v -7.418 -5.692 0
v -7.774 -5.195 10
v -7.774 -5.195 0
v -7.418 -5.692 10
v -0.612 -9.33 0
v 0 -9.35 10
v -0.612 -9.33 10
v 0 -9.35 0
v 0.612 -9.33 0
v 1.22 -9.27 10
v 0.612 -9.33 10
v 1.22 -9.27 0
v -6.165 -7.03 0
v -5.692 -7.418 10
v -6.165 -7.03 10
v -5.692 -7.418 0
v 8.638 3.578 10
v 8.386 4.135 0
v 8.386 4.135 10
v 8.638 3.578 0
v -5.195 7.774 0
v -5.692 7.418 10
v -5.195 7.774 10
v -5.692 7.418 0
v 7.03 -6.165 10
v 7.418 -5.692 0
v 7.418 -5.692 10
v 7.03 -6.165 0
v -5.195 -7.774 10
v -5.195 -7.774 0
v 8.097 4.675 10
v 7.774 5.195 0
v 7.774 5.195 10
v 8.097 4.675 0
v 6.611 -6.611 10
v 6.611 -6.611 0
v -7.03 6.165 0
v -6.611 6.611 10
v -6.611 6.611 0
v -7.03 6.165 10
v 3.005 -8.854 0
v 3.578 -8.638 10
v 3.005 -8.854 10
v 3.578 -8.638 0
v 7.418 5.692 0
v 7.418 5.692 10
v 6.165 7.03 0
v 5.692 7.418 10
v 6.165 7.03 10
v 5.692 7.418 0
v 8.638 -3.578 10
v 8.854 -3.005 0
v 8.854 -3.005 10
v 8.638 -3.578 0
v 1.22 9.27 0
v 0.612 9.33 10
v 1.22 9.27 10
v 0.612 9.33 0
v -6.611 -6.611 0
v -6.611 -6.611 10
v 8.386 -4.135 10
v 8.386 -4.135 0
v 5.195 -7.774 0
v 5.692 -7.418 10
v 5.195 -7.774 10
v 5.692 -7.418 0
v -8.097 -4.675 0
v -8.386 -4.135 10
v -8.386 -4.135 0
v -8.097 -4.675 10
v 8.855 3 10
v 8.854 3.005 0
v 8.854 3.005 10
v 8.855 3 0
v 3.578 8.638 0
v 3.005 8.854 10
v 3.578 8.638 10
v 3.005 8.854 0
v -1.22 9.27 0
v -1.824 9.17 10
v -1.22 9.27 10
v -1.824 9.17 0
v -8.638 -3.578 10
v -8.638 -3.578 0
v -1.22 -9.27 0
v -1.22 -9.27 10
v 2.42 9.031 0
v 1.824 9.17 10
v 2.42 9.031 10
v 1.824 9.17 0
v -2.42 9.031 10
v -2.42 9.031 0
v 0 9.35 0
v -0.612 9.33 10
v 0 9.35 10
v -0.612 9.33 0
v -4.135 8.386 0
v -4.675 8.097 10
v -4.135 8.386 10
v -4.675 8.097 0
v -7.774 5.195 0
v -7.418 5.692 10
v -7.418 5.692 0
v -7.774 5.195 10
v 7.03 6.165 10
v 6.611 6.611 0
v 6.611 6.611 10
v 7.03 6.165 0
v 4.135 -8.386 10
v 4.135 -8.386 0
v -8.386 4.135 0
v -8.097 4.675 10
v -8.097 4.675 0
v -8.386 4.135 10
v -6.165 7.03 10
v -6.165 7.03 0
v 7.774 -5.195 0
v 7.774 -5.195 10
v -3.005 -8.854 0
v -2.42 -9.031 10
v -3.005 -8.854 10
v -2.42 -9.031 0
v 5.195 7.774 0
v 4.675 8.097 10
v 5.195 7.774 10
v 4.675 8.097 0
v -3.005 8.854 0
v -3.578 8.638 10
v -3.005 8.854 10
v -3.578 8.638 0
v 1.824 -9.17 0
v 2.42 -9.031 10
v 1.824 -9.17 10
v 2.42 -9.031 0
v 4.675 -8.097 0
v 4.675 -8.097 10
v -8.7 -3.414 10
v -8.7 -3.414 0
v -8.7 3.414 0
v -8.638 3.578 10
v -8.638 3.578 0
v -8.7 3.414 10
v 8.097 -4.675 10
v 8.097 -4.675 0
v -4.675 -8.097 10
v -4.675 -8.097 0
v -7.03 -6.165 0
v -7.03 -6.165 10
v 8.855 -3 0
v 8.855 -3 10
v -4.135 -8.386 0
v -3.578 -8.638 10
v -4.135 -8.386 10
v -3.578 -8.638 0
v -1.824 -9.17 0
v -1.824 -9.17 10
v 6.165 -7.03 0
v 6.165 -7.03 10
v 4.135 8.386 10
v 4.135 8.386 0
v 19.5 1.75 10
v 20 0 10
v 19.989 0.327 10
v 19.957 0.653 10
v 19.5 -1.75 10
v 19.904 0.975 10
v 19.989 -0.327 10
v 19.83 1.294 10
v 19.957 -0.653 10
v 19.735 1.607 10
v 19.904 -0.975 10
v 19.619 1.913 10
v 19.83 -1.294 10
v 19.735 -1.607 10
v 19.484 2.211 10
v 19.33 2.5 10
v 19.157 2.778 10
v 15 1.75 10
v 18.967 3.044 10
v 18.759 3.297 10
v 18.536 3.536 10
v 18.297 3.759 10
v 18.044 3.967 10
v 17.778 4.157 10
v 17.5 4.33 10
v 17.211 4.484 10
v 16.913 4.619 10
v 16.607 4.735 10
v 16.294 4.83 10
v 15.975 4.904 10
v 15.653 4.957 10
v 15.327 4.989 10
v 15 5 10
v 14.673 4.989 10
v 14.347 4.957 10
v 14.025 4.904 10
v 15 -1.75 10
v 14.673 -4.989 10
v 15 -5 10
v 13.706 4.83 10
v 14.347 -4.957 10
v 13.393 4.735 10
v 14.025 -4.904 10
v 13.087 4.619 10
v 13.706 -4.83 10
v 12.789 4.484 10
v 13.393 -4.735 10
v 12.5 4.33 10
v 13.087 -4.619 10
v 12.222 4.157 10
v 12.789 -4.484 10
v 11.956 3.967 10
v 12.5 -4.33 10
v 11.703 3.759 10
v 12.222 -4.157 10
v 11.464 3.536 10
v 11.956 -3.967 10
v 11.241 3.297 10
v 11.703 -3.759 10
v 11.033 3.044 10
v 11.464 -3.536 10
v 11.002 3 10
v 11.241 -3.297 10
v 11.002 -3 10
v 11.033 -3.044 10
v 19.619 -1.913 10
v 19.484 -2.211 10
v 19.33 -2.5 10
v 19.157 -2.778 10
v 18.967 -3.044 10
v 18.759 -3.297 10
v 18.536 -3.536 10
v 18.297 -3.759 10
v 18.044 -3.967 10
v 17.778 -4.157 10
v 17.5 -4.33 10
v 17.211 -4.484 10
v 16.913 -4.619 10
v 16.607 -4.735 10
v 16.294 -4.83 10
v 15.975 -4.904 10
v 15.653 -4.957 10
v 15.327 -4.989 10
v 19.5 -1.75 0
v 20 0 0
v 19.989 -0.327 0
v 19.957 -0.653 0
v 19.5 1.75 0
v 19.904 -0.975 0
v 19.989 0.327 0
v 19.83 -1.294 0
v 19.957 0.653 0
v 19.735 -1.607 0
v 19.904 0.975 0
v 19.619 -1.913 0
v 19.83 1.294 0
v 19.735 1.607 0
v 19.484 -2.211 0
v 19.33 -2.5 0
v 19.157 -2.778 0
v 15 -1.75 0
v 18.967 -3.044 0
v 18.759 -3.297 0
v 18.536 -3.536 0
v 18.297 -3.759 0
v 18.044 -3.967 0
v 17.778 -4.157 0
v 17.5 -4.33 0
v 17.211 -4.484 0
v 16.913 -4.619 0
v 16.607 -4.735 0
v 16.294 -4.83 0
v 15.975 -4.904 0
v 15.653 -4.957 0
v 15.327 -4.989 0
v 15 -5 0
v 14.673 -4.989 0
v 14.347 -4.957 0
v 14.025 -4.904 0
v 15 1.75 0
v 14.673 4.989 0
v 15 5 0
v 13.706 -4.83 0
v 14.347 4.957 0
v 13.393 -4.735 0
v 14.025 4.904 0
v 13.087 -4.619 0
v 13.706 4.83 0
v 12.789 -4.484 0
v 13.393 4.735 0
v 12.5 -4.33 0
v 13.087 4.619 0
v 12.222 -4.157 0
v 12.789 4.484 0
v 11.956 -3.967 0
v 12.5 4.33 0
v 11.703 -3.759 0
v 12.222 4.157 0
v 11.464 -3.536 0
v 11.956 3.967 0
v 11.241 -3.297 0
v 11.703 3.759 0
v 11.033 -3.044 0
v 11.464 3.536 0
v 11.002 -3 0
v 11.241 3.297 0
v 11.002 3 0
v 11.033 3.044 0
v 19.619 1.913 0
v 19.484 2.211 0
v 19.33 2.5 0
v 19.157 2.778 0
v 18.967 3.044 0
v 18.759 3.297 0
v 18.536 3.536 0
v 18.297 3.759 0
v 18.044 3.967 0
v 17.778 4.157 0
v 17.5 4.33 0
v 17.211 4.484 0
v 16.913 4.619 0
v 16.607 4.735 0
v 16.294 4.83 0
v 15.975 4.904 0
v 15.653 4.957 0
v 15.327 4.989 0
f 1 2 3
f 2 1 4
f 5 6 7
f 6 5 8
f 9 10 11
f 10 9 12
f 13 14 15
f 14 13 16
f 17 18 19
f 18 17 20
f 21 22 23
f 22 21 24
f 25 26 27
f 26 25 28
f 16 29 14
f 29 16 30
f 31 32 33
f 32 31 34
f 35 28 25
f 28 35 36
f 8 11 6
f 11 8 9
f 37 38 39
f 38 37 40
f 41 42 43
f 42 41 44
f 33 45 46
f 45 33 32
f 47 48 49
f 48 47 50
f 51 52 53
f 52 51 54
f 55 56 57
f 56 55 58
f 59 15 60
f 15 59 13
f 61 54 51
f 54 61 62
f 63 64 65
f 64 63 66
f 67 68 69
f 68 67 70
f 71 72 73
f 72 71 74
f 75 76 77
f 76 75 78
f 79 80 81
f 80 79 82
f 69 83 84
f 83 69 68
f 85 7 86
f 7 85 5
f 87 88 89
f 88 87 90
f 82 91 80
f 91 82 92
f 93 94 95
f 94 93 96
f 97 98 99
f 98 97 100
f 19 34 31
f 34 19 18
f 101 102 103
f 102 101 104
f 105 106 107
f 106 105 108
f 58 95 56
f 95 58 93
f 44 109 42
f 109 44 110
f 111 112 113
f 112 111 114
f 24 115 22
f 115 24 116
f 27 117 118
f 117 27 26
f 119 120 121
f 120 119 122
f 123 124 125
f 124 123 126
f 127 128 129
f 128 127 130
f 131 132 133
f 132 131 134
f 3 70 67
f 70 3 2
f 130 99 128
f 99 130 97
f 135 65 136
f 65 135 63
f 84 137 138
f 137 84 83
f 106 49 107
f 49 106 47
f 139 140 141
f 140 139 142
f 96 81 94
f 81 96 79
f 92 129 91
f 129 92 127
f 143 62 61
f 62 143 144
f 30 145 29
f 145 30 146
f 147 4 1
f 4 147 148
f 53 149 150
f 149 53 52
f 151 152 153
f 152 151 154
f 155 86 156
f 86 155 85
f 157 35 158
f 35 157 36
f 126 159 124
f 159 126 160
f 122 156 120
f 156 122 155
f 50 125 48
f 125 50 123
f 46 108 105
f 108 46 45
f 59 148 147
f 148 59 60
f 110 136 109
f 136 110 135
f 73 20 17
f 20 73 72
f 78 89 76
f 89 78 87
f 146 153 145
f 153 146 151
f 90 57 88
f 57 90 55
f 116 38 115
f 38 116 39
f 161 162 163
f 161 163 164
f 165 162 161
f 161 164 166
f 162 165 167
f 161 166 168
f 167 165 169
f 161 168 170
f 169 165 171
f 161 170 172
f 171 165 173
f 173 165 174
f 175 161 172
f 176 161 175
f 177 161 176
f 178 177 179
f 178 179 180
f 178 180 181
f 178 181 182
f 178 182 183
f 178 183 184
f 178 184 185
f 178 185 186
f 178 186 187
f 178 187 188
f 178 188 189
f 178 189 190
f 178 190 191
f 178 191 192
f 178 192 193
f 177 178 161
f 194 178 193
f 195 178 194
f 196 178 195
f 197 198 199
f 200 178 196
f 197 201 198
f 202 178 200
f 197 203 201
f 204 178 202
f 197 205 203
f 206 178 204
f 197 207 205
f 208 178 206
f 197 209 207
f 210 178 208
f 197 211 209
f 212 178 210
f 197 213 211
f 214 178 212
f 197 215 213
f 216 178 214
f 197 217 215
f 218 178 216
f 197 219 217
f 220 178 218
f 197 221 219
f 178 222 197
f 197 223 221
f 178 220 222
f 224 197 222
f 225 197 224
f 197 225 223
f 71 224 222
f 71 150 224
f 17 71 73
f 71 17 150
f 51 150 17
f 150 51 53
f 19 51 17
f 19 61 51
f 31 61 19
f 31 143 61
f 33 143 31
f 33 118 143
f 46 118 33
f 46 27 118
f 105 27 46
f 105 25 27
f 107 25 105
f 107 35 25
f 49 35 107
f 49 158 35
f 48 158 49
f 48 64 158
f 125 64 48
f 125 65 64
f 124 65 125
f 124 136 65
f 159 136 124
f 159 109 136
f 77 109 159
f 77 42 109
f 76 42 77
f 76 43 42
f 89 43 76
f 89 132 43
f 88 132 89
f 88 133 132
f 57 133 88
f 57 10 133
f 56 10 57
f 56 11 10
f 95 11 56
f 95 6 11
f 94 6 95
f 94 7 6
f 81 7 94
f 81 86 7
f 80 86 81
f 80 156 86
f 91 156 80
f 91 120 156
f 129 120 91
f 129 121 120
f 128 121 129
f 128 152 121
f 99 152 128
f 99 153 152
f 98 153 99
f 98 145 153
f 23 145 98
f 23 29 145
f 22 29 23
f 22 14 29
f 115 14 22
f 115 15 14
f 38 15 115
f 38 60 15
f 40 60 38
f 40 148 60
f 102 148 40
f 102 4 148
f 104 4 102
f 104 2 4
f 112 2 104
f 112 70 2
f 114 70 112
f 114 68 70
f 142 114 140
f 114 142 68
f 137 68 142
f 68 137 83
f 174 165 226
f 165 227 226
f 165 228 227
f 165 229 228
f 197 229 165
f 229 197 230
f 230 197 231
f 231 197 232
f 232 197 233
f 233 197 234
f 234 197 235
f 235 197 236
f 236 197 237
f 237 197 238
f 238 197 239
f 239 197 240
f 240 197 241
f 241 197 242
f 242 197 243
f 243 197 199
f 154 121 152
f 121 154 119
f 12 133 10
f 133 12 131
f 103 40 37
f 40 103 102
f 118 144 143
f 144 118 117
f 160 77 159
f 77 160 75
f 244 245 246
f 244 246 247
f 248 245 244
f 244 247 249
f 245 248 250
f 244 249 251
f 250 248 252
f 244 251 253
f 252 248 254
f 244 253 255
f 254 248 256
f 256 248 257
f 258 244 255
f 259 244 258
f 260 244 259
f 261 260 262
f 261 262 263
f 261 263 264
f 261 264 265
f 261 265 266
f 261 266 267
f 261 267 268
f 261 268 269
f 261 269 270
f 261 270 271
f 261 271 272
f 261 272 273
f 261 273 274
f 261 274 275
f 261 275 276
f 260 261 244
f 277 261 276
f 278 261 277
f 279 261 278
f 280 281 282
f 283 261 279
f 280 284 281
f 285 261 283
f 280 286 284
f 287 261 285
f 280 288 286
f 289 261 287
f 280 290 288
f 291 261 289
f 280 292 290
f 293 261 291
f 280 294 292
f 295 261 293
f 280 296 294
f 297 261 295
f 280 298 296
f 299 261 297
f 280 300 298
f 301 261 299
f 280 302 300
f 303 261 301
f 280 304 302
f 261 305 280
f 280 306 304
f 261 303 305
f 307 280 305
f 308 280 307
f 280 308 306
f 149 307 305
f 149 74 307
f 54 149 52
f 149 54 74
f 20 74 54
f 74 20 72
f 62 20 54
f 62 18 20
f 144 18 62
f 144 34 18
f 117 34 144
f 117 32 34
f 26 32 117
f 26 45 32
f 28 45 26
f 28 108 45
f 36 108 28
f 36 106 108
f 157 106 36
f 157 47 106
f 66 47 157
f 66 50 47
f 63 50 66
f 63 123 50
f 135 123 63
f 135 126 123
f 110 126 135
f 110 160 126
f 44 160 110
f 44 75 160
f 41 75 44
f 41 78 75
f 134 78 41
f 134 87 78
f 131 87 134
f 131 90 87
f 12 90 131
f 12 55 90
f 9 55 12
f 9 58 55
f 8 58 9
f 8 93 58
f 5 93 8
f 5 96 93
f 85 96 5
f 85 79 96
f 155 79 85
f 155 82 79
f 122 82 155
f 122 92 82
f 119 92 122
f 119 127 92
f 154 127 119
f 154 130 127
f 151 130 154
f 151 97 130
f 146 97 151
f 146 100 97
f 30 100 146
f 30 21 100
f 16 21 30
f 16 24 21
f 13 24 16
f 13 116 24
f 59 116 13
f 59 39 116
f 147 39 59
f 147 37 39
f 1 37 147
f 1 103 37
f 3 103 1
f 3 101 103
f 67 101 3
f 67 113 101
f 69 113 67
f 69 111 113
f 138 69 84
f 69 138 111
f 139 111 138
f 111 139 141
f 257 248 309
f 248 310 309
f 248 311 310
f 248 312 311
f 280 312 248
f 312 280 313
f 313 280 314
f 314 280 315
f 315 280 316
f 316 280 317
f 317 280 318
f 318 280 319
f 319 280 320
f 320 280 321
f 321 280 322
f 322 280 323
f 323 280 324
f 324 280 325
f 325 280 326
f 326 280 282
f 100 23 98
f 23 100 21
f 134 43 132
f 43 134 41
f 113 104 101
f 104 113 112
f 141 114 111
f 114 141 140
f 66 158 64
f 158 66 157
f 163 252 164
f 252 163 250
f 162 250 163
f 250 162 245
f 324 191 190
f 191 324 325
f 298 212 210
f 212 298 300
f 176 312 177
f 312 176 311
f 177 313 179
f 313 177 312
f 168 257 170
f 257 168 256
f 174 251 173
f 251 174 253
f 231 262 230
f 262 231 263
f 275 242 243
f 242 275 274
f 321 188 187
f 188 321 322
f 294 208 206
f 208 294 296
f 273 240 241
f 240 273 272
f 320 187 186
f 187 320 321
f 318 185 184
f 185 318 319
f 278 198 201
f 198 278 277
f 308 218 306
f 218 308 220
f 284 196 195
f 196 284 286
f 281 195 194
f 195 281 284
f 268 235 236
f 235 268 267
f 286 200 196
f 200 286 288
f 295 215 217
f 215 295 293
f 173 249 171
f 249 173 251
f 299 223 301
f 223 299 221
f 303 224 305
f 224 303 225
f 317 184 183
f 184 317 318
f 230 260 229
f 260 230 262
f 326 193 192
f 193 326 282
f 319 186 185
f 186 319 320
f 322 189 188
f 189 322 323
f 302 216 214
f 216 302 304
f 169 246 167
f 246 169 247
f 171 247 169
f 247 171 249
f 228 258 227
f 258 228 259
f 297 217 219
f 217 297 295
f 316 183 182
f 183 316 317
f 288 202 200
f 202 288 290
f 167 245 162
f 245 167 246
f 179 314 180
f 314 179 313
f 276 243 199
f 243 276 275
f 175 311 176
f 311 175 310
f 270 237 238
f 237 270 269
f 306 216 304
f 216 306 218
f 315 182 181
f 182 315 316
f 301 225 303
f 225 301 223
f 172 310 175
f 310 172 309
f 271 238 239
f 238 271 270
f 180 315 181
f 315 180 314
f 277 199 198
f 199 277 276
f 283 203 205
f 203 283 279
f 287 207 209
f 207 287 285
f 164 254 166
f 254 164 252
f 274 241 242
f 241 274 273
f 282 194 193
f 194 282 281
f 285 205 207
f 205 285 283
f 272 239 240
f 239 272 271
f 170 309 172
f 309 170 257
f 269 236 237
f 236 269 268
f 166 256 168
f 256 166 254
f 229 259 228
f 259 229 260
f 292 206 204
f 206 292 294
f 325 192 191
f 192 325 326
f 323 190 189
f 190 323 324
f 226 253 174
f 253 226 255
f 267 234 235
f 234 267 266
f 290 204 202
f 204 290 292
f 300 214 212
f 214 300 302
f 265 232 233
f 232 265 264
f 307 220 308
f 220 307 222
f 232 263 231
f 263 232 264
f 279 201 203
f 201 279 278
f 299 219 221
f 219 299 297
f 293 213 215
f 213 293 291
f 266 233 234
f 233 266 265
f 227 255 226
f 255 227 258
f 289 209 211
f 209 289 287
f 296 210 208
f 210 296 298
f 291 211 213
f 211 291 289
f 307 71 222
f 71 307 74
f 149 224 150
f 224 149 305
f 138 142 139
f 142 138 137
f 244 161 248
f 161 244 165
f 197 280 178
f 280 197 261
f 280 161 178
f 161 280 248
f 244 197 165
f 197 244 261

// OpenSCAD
// Tubing clip for 12.7 mm (1/2 inch) lab stand rod
// Print orientation: flat, extruded along Z (z = 0 to 10)

// ---------- Parameters ----------
extrusion_height = 10;      // Z height of the part
rod_d            = 12.7;    // stand rod inner diameter
rod_wall         = 3;       // stand rod ring wall thickness
rod_opening_w    = 10;      // width of the -X side opening in the rod ring
tubing_d         = 6;       // tubing inner diameter
tubing_wall      = 2;       // tubing ring wall thickness
tubing_opening_w = 4.5;     // width of the +X side opening in the tubing ring
bridge_w         = 6;       // solid bridge width (Y)
bridge_x0        = 8;       // bridge start (X)
bridge_x1        = 12;      // bridge end (X)
eps              = 0.5;     // cutter overshoot past faces

$fn = 96;

// ---------- Derived ----------
rod_outer = rod_d + 2 * rod_wall;
tubing_outer = tubing_d + 2 * tubing_wall;
tubing_opening_y = (tubing_opening_w / 2) - eps;  // y limit for opening

// ---------- Model ----------
difference() {
    union() {
        // Rod ring
        cylinder(d = rod_outer, h = extrusion_height);
        // Tubing ring
        translate([15, 0, 0])
            cylinder(d = tubing_outer, h = extrusion_height);
        // Solid bridge
        translate([bridge_x0, -bridge_w / 2, 0])
            cube([bridge_x1 - bridge_x0, bridge_w, extrusion_height]);
    }

    // Cut the -X opening in the rod ring
    translate([-rod_outer, -rod_opening_w / 2, -eps])
        cube([rod_opening_w, rod_opening_w, extrusion_height + 2 * eps]);

    // Cut the +X opening in the tubing ring
    translate([15, -tubing_opening_y, -eps])
        cube([tubing_opening_w, 2 * tubing_opening_y, extrusion_height + 2 * eps]);
}
